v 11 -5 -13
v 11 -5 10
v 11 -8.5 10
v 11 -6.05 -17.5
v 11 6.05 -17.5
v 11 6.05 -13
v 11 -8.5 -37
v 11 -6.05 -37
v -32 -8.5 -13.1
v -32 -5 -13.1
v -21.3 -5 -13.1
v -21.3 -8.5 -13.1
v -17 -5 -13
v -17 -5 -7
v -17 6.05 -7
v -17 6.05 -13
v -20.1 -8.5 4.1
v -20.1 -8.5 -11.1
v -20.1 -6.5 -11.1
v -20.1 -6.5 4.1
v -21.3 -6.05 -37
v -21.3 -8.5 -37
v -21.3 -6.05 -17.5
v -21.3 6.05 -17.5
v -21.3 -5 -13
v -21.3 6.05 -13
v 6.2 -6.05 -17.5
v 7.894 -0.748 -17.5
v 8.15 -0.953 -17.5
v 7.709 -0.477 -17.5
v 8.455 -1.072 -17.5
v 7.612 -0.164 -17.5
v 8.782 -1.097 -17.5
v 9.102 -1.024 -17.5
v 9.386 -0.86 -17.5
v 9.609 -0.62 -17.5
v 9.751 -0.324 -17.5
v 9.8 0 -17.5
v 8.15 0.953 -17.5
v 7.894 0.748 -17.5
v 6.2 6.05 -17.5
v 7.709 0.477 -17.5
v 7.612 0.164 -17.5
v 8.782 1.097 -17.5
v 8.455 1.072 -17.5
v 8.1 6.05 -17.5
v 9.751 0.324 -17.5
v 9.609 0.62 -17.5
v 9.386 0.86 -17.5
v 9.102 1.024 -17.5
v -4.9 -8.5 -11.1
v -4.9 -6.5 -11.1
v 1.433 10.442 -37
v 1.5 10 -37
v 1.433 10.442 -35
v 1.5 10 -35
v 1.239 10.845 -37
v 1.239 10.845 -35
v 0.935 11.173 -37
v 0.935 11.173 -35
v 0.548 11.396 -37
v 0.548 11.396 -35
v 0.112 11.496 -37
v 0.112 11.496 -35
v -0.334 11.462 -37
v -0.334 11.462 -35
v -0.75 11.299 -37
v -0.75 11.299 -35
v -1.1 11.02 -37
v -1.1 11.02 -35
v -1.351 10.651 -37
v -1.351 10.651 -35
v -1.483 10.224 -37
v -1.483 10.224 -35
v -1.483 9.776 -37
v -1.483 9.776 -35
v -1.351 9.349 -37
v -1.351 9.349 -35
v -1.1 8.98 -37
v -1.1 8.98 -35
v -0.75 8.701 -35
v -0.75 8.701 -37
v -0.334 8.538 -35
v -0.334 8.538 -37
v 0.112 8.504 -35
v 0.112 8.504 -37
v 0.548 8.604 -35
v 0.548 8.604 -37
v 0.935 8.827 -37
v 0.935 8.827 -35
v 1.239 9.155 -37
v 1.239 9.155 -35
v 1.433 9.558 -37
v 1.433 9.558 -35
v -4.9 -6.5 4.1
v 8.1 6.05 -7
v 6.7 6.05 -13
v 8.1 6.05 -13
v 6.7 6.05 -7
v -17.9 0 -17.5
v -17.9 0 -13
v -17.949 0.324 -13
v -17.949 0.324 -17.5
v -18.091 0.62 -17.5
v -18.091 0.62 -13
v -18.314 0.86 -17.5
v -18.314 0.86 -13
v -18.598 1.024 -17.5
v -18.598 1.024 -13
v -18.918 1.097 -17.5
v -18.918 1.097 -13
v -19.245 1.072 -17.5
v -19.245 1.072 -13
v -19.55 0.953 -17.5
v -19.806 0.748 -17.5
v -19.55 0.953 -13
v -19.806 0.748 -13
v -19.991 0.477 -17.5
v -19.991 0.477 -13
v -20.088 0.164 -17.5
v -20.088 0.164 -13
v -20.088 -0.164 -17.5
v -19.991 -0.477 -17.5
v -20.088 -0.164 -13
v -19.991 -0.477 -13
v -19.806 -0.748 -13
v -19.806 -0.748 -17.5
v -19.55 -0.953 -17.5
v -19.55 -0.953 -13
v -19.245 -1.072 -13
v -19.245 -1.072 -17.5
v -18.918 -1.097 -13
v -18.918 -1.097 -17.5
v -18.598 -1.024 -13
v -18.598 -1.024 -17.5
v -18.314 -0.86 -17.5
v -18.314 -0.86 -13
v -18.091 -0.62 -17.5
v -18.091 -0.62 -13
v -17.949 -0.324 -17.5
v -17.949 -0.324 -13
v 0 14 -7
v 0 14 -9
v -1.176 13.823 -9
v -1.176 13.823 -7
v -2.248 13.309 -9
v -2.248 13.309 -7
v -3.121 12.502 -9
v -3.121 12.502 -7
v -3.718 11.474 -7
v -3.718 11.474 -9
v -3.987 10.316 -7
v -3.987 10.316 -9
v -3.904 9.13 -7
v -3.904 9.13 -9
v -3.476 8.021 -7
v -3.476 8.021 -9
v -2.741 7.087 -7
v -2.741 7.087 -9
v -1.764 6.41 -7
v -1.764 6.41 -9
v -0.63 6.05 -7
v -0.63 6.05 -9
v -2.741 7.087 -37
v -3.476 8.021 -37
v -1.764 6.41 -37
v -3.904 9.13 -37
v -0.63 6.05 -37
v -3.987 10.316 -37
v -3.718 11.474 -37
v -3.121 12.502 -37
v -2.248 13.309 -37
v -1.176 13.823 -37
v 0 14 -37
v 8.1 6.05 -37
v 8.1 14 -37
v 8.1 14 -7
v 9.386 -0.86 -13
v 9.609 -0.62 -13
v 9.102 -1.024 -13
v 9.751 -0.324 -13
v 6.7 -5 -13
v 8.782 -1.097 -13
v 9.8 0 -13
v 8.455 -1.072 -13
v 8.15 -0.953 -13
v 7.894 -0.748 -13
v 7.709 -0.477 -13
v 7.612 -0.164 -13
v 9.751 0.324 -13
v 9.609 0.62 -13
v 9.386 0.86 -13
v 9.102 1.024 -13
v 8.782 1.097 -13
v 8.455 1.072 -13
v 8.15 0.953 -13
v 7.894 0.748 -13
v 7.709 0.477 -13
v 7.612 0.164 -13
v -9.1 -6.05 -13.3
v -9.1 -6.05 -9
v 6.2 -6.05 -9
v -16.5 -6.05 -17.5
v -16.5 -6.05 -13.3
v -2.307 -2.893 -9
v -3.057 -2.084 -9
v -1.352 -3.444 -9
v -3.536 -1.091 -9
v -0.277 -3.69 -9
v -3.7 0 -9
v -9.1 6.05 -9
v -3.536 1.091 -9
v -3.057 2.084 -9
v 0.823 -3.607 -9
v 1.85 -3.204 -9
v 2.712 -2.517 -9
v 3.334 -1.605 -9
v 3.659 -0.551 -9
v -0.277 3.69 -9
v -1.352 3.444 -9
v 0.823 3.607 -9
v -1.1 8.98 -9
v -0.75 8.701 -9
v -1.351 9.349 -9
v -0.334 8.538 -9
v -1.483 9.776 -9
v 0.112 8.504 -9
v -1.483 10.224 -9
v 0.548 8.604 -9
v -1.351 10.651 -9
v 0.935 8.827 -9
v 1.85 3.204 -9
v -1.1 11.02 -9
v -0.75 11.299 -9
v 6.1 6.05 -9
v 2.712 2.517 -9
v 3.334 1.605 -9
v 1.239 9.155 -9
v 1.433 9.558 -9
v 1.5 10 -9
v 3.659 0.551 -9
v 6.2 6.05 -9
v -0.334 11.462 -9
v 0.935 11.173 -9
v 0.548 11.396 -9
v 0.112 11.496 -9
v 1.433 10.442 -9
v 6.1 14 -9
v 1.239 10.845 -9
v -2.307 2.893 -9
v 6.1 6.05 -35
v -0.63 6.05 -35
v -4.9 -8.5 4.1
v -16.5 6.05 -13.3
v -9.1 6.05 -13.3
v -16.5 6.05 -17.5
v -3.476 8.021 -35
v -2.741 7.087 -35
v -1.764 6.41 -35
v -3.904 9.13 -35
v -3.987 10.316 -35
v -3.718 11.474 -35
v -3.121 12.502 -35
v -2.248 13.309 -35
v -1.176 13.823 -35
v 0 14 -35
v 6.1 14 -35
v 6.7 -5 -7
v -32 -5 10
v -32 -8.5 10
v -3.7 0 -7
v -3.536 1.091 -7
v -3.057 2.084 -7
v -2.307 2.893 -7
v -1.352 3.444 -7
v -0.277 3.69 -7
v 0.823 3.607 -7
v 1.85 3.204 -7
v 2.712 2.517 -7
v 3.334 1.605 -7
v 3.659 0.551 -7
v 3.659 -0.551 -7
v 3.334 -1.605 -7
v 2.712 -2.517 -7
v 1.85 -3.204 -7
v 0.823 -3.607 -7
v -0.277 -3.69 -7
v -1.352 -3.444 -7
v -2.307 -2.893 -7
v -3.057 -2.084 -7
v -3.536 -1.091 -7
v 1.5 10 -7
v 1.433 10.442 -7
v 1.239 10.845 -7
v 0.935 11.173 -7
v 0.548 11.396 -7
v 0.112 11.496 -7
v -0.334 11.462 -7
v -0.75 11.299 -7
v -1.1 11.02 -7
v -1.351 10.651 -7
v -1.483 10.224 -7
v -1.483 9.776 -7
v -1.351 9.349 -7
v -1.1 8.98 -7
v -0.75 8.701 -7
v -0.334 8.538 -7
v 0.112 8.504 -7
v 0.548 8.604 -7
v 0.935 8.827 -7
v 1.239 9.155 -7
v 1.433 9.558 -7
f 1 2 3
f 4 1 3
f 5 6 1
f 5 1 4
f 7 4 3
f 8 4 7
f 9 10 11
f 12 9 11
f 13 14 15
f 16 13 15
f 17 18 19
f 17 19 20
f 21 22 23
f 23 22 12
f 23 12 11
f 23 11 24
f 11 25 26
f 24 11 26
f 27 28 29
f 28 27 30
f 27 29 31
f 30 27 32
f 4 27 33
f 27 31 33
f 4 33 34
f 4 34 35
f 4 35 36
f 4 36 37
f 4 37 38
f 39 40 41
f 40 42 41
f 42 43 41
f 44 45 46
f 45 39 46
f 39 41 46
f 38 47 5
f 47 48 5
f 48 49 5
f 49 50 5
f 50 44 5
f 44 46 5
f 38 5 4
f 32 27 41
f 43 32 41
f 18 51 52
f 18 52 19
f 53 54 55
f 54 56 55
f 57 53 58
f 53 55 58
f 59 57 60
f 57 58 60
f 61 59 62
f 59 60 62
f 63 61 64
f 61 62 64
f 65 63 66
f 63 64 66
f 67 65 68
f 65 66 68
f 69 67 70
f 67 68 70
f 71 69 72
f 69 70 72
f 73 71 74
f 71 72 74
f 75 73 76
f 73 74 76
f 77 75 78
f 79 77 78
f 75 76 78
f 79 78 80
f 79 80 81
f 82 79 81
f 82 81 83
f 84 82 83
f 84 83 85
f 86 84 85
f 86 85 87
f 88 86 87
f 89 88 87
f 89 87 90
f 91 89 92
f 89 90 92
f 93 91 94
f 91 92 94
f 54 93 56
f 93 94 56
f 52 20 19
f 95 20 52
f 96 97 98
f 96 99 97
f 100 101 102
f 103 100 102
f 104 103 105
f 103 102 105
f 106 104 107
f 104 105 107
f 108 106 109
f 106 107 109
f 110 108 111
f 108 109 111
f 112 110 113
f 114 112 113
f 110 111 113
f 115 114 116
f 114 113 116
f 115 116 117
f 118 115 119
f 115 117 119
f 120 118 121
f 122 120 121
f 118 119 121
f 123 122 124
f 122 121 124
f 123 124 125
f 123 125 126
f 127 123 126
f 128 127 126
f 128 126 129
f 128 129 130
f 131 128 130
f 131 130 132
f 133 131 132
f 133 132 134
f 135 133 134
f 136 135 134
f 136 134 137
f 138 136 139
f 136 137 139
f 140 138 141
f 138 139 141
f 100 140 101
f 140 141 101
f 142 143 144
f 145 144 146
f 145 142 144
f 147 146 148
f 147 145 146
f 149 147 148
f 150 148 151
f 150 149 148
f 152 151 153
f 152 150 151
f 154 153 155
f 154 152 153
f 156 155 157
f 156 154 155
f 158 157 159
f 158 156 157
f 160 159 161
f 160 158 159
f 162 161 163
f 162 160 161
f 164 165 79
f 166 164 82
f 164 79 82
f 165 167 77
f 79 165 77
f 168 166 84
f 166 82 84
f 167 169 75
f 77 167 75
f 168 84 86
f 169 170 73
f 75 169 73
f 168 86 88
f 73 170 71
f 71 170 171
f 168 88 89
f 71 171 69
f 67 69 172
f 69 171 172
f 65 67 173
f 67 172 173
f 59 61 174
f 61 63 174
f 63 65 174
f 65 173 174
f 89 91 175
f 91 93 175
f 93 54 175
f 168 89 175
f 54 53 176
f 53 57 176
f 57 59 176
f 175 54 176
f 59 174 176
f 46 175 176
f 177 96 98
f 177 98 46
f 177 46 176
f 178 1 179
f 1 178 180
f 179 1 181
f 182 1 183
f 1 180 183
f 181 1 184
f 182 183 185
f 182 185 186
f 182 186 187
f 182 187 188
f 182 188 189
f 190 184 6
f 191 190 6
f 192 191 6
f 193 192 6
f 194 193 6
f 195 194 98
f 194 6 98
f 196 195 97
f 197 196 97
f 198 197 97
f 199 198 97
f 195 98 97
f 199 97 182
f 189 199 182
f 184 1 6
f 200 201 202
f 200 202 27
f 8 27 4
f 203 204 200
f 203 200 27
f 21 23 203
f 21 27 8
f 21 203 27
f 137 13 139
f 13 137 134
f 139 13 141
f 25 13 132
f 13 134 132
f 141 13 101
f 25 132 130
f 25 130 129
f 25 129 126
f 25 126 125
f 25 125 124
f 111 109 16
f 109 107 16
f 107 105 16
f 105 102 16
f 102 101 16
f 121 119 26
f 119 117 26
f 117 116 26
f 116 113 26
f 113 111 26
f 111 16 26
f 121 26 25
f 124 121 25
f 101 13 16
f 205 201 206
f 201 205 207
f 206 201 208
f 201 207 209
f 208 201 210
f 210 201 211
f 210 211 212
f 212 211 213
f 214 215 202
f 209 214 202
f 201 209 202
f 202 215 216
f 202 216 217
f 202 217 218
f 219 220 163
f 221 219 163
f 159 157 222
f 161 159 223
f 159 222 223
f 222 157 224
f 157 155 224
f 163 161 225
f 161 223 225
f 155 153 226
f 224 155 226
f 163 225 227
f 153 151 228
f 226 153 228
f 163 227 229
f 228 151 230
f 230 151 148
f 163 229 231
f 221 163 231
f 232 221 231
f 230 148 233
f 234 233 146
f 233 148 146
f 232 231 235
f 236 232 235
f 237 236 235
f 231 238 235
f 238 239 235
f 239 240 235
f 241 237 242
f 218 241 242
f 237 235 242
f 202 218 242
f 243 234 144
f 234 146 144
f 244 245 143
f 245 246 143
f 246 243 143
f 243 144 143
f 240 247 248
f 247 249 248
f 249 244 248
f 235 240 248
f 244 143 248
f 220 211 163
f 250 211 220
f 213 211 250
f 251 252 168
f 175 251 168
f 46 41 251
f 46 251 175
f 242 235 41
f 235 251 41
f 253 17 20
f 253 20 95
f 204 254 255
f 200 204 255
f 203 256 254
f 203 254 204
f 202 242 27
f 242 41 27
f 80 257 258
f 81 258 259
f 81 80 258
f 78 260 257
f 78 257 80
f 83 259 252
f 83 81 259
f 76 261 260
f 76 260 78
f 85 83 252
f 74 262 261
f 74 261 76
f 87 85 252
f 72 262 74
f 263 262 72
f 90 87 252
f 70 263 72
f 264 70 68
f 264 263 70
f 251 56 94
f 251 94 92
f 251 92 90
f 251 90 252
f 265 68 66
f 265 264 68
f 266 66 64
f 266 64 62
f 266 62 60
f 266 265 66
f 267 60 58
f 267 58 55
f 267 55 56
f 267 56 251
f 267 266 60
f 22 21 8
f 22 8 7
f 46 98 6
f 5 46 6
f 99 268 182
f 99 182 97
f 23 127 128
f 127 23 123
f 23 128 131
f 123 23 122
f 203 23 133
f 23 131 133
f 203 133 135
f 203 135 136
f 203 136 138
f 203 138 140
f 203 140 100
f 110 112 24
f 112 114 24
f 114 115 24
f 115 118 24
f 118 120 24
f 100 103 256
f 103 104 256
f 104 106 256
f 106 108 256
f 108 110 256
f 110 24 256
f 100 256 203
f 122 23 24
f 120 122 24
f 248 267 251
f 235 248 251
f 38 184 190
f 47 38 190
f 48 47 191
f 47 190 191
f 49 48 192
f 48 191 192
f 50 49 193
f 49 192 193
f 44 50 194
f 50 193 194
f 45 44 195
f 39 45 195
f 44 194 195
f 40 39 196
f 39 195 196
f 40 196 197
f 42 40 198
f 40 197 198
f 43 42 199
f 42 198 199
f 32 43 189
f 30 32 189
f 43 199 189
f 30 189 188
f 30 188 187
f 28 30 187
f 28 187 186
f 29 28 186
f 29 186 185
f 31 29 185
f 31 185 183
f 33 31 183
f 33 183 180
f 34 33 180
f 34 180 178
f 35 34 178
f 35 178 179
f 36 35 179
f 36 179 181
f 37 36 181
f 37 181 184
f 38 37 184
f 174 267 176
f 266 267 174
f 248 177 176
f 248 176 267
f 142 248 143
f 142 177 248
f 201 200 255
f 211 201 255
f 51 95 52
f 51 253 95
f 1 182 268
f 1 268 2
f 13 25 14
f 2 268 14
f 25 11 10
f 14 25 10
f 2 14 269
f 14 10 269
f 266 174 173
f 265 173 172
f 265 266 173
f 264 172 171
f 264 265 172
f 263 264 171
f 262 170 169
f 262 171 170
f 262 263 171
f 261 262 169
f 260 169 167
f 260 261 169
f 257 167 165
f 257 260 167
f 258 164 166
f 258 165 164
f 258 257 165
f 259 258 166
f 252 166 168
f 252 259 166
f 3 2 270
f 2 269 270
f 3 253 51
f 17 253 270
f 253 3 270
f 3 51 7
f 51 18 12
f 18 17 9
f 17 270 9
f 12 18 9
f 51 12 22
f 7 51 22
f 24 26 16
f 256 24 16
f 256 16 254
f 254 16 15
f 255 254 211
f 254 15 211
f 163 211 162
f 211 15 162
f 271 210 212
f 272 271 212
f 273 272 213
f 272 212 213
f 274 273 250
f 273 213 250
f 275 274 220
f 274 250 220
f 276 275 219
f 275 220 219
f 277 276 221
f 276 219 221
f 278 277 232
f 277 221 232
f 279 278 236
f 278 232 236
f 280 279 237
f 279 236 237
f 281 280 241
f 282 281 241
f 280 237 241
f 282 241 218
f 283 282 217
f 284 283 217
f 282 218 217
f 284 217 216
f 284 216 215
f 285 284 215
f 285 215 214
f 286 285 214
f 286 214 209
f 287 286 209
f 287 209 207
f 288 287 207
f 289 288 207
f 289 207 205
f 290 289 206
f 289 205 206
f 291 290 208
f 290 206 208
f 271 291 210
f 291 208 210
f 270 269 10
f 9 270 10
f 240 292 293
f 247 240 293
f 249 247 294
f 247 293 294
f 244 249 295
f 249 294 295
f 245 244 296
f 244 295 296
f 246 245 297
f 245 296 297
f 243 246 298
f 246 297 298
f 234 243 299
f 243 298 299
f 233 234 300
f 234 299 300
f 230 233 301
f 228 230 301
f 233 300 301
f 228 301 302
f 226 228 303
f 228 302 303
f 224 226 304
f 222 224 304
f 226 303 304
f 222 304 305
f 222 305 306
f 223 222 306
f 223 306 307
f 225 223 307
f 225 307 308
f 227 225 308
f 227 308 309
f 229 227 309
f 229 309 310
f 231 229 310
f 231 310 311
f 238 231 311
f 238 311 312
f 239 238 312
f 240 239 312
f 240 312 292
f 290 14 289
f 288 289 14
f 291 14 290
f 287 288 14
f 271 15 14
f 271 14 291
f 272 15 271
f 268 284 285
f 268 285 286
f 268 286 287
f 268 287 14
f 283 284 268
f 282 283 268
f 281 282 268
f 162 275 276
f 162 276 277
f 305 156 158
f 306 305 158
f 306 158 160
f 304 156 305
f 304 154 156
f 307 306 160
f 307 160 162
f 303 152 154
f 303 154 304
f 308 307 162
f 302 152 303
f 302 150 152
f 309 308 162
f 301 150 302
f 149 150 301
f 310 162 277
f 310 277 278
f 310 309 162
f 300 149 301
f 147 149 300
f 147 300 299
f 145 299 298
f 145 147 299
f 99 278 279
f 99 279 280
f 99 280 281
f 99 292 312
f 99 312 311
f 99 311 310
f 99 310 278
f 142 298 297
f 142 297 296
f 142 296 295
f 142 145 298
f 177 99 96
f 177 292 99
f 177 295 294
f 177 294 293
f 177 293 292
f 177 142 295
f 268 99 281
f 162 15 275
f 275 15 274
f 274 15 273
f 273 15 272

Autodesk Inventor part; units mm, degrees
sketch "スケッチ1" plane through (0, 0, 0) normal (0, 0, 1) x (1, 0, 0)
  circle A0 centre (0, 0) radius 1.5
  circle A1 centre (0, 0) radius 4
  line L0 (6.1, 4) -> (6.1, -4)
  line L1 (-27.76, 0) -> (17.46, 0) construction
  line L2 (6.1, 4) -> (0, 4)
  line L3 (6.1, -4) -> (0, -4)
  line L4 (6.1, -4) -> (8.1, -4)
  line L5 (8.1, -4) -> (8.1, 4)
  line L6 (8.1, 4) -> (6.1, 4)
  line L7 (0, -13.6) -> (0, 18.6) construction
  circle A2 centre (0, 10) radius 1.5
  circle A3 centre (0, 10) radius 4
  line L8 (6.1, 14) -> (6.1, 6)
  line L9 (6.1, 14) -> (0, 14)
  line L10 (6.1, 6) -> (0, 6)
  line L11 (6.1, 6) -> (8.1, 6)
  line L12 (8.1, 6) -> (8.1, 14)
  line L13 (8.1, 14) -> (6.1, 14)
  line L14 (-16.4, 6.05) -> (6.1, 6.05) construction
  line L15 (6.1, 6.05) -> (6.1, -6.05)
  line L16 (6.1, -6.05) -> (-16.4, -6.05) construction
  line L17 (-16.4, -6.05) -> (-16.4, 6.05)
  line L18 (-16.4, 6.05) -> (6.1, -6.05) construction
  line L19 (6.1, 6.05) -> (-16.4, -6.05) construction
  line L20 (-21.3, 6.05) -> (11, 6.05) construction
  line L21 (11, 6.05) -> (11, -6.05) construction
  line L22 (11, -6.05) -> (-21.3, -6.05)
  line L23 (-21.3, -6.05) -> (-21.3, 6.05) construction
  line L24 (-21.3, 6.05) -> (11, -6.05) construction
  line L25 (11, 6.05) -> (-21.3, -6.05) construction
  line L26 (-21.3, 0) -> (11, 0) construction
  circle A4 centre (-19, 0) radius 1.1
  line L27 (-5.15, 6.05) -> (-5.15, -6.05) construction
  circle A5 centre (0, 0) radius 2.425
  circle A6 centre (0, 0) radius 6.05
  circle A7 centre (0, 0) radius 9
  line L28 (8.1, -7) -> (-21.3, -7)
  line L29 (-21.3, -7) -> (-21.3, 6.05)
  line L30 (-21.3, 6.05) -> (8.1, 6.05)
  line L31 (8.1, 6.05) -> (8.1, -7)
  line L32 (-21.3, -5) -> (-20.943492, -5)
  line L33 (-20.943492, -5) -> (8.1, -5)
  circle A8 centre (8.7, 0) radius 1.1
  line L34 (8.1, 6.05) -> (11, 6.05)
  line L35 (11, 6.05) -> (11, -6.05)
  point P0 (6.1, 0)
  point P1 (6.1, 10)
  point P2 (-5.15, 0)
  point P3 (-5.15, 0)
  point P4 (-0.630476, 6.05)
  point P5 (8.1, 6.05)
  point P6 (8.1, -6.05)
  point P7 (0, 6.05)
  point P8 (-6.663145, 6.05)
  point P9 (-6.663145, -6.05)
  point P10 (0, -6.05)
  point P11 (6.1, 6.617401)
  point P12 (6.663145, 6.05)
  point P13 (0.630476, 6.05)
  point P14 (0.489992, 6.030125)
  point P15 (0.776209, 6)
  point P16 (8.062258, 4)
  point P17 (8.1, 3.923009)
  point P18 (8.062258, -4)
  point P19 (8.1, -3.923009)
  point P20 (6.708204, 6)
  dimension "d0" = 3
  dimension "d1" = 8
  dimension "d3" = 8
  dimension "d4" = 2
  dimension "d11" = 10
  dimension "d21" = 12.1
  dimension "d22" = 22.5
  dimension "d23" = 32.3
  dimension "d24" = 2.2
  dimension "d26" = 27.7
  dimension "d28" = 18
  dimension "d29" = 12.1
  dimension "d30" = 4.85
  dimension "d31" = 6.1
  dimension "d32" = 7
  dimension "d55" = 2
extrude "押し出し1" add sketch "スケッチ1" along normal blind 2 contours A1 | A1 L2 A6 L3 | L2 L0 L3 A6 | L6 A7 L5 A8 L4 L0 | L6 L5 A7 | A7 L5 L4 | L5 A8 | A5
extrude "押し出し2" add sketch "スケッチ1" against normal blind 7 contours L6 A7 L5 A8 L4 L0 | L6 L5 A7 | A7 L5 L4 | L5 A8
extrude "押し出し3" add sketch "スケッチ1" against normal blind 2 from surface at -7 contours A6 A3 L30 L8 L10 | L10 A3 A6 | L8 L30 A7 L11 | A3 A6 | A6 L30 A3 | A7 L30 L12 L11 | L30 A3 A7 L8 | L8 A7 L30 | A3 L30 A6 | L30 A3 A7 A2 | A7 L8 L13 L12 L30 | A7 A3 L9 L8 | A7 A2 A3
pattern_linear "矩形状パターン1" count 2 spacing 28 along (0, 0, -1) of "押し出し3"
ref_plane "作業平面1" through (0, 0, -17.5) normal (0, 0, 1) x (1, 0, 0)
extrude "押し出し4" add sketch "スケッチ1" against normal up to surface (10.5 mm away) from surface at -7 contours A0 | A1 | A1 L2 A6 L3 | A1 L3 A6 L33 A3 L10 L2 | A6 L10 L15 L2 | L2 L0 L3 A6 | L3 L15 L33 A6 | L6 A7 L5 A8 L4 L0 | L15 L11 A7 L6 | A6 A3 L30 L8 L10 | L10 A3 A6 | L4 A7 L33 L15 | L33 L15 L22 A6 | A6 L33 | A7 L11 L31 L6 | L6 L5 A7 | L8 L30 A7 L11 | A3 A6 | A6 L30 A3 | A7 L5 L4 | L4 L31 L33 A7 | L33 A7 L22 L15 | L22 A7 L28 | L22 A7 L33 A6 | L33 A7 L30 A3 A6 | A7 L30 L12 L11 | A3 L30 A6 | L33 L31 L22 A7 | A7 L28 L29 L22 | L22 L17 L33 A7 | L33 L17 L30 A7 | L5 A8 | L22 L31 L28 A7 | L22 L29 L32 L33 L17 | L33 L32 L29 L30 L17 | A4 | A5
ref_plane "作業平面2" through (0, 0, -13.3) normal (0, 0, 1) x (1, 0, 0)
extrude "押し出し6" cut sketch "スケッチ1" against normal blind 23.4 from surface at -13.3 contours A0 | A1 | A1 L2 A6 L3 | A1 L3 A6 L33 A3 L10 L2 | A6 L10 L15 L2 | L2 L0 L3 A6 | L3 L15 L33 A6 | A6 A3 L30 L8 L10 | L10 A3 A6 | L33 L15 L22 A6 | A6 L33 | A3 A6 | A6 L30 A3 | L22 A7 L33 A6 | L33 A7 L30 A3 A6 | A3 L30 A6 | L22 L17 L33 A7 | L33 L17 L30 A7 | A5
ref_plane "作業平面3" through (0, 0, -9) normal (0, 0, 1) x (1, 0, 0)
extrude "押し出し7" cut sketch "スケッチ1" against normal up to surface (4.3 mm away) from surface at -9 contours A0 | A1 | A1 L2 A6 L3 | A1 L3 A6 L33 A3 L10 L2 | L10 A3 A6 | A6 L33 | A3 A6 | L22 A7 L33 A6 | L33 A7 L30 A3 A6 | A3 L30 A6 | A5 picked at (-0.459231, 6.046871)
extrude "押し出し8" cut sketch "スケッチ1" against normal up to surface (9 mm away) contours A0 | A5
extrude "押し出し9" cut sketch "スケッチ1" against normal through all contours A4
extrude "押し出し10" add sketch "スケッチ1" against normal up to surface (28 mm away) from surface at -9 contours L22 A7 L28 | L8 A7 L30 | A7 L28 L29 L22 | A7 L8 L13 L12 L30 | L22 L31 L28 A7
extrude "押し出し11" cut sketch "スケッチ1" against normal up to surface (19.5 mm away) from surface at -17.5 contours A6 A3 L30 L8 L10 | L10 A3 A6 | L8 L30 A7 L11 | A3 A6 | A6 L30 A3 | A7 L30 L12 L11 | A3 L30 A6
sketch "スケッチ3" plane through (0, 4, 2) normal (0, 1, 0) x (1, 0, 0)
  line L0 (8.1, 0) -> (0, 0) projected
  line L1 (8.1, 9) -> (8.1, 0) projected
  line L2 (6.1, 9) -> (8.1, 9) projected
  line L3 (6.1, 2) -> (6.1, 9) projected
  line L4 (6.1, 2) -> (0, 2) projected
  line L5 (0, 2) -> (0, 0) projected
  line L6 (0, 2) -> (0, 2) projected
  line L7 (0, 2) -> (0, 0) projected
  line L8 (0, 0) -> (0, 0) projected
  line L9 (0, 2) -> (0, 0) projected
  line L10 (-4, 2) -> (-4, 0) projected
  line L11 (-4, 2) -> (0, 2) projected
  line L12 (-4, 0) -> (0, 0) projected
extrude "押し出し12" cut sketch "スケッチ3" against normal through all
extrude "押し出し13" add sketch "スケッチ1" along normal blind 10 and the other way blind 7 contours L33 L15 L22 A6 | A6 L33 | L33 A7 L22 L15 | L22 A7 L28 | L22 A7 L33 A6 | L33 L31 L22 A7 | A7 L28 L29 L22 | L22 L17 L33 A7 | L22 L31 L28 A7 | L22 L29 L32 L33 L17
sketch "スケッチ4" plane through (-21.3, 6.05, -17.5) normal (-1, 0, 0) x (0, 0, 1)
  line L0 (27.5, -13.05) -> (-19.5, -13.05) projected
  line L1 (27.5, -11.05) -> (27.5, -13.05) projected
  line L2 (10.5, -11.05) -> (27.5, -11.05) projected
  line L3 (10.5, 0) -> (10.5, -11.05) projected
  line L4 (10.5, 0) -> (0, 0) projected
  line L5 (0, -12.1) -> (0, 0) projected
  line L6 (0, -12.1) -> (-19.5, -12.1) projected
  line L7 (-19.5, -12.1) -> (-19.5, -13.05) projected
  line L8 (10.5, -11.05) -> (10.5, -13.05)
  point P0 (17.5, -6.05)
extrude "押し出し14" add sketch "スケッチ4" along normal blind 10.7 contours L0 L8 L2 L1
sketch "スケッチ5" plane through (-21.3, -5, -47) normal (0, -1, 0) x (1, 0, 0)
  line L0 (29.4, 10) -> (29.4, 57) projected
  line L1 (29.4, 57) -> (-10.7, 57) projected
  line L2 (-10.7, 40) -> (-10.7, 57) projected
  line L3 (0, 40) -> (-10.7, 40) projected
  line L4 (0, 40) -> (0, 10) projected
  line L5 (0, 10) -> (29.4, 10) projected
  line L6 (-10.7, 43.5) -> (29.4, 43.5) construction
  line L7 (1.2, 51.1) -> (16.4, 51.1)
  line L8 (16.4, 51.1) -> (16.4, 35.9)
  line L9 (16.4, 35.9) -> (1.2, 35.9)
  line L10 (1.2, 35.9) -> (1.2, 51.1)
  line L11 (1.2, 51.1) -> (16.4, 35.9) construction
  line L12 (16.4, 51.1) -> (1.2, 35.9) construction
  line L13 (-10.7, 57) -> (-10.7, 40) projected
  line L14 (-10.7, 40) -> (-10.7, 33.9)
  line L15 (-10.7, 33.9) -> (0, 33.9)
  line L16 (29.4, 57) -> (-10.7, 57) projected
  point P0 (21.3, 47)
  point P1 (8.8, 43.5)
  dimension "d63" = 15.2
  dimension "d64" = 15.2
  dimension "d68" = 13.5
  dimension "d69" = 2
  dimension "d105" = 19.5
extrude "押し出し17" add sketch "スケッチ5" along normal blind 1.5 from surface at 2 contours L5 L4 L3 L2 L1 L0 | L7 L8 L9 L10
extrude "押し出し15" cut sketch "スケッチ5" against normal blind 2 from surface at 3.5 contours L7 L8 L9 L10
ref_plane "作業平面4" through (-12.5, -8.5, -11.1) normal (-1, 0, 0) x (0, 0, 1)
ref_plane "作業平面5" through (-20.1, -6.5, -3.5) normal (0, 0, 1) x (1, 0, 0)
extrude "押し出し16" add sketch "スケッチ5" along normal up to surface (3.5 mm away) contours L15 L14 L3 L4
extrude "押し出し18" add sketch "スケッチ1" against normal up to surface (10.5 mm away) from surface at -7 contours L6 A7 L5 A8 L4 L0 | L15 L11 A7 L6 | L4 A7 L33 L15 | A7 L11 L31 L6 | L4 L31 L33 A7 | L33 A7 L22 L15 | L31 L12 L34 L35 L22 L5 A7 A8 | A7 A8 L5 | A7 L30 L12 L11 | L33 L31 L22 A7 | L5 A8 A7 | A8 A7 L5 | L5 A8 | A8 A7
extrude "押し出し19" cut sketch "スケッチ1" against normal through all contours A8 A7 L5 | L5 A8 | A8 A7 picked at (8.4, 0)
sketch "スケッチ6" plane through (8.1, -5, 10) normal (1, 0, 0) x (0, 0, -1)
  line L0 (27.5, -1.05) -> (17, -1.05) projected
  line L1 (17, -1.05) -> (17, 0) projected
  line L2 (17, 0) -> (0, 0) projected
  line L3 (0, 0) -> (0, -3.5) projected
  line L4 (0, -3.5) -> (47, -3.5) projected
  line L5 (47, -1.05) -> (47, -3.5) projected
  line L6 (27.5, -1.05) -> (47, -1.05) projected
  point P0 (10, 5)
extrude "押し出し20" add sketch "スケッチ6" along normal up to surface (2.9 mm away)
sketch "スケッチ7" plane through (6.1, -6.05, -17.5) normal (0, 0, -1) x (-1, 0, 0)
  circle A0 centre (-2.6, 6.05) radius 1.1
  line L0 (-4.9, 0) -> (0, 0)
  line L1 (0, 0) -> (0, 12.1)
  line L2 (0, 12.1) -> (-2, 12.1)
  line L3 (-2, 12.1) -> (-4.9, 12.1)
  line L4 (-4.9, 12.1) -> (-4.9, 0)
  line L5 (0, 12.1) -> (0, 0)
  line L6 (0, 0) -> (6.1, 0)
  arc A1 (6.1, 12.1) -> (6.1, 0) centre (6.1, 6.05) ccw
  line L7 (0, 12.1) -> (6.1, 12.1)
  arc A2 (12.763145, 0) -> (12.763145, 12.1) centre (6.1, 6.05) ccw
  line L8 (12.763145, 0) -> (22.5, 0)
  line L9 (22.5, 0) -> (22.5, 12.1)
  line L10 (12.763145, 12.1) -> (22.5, 12.1)
  line L11 (22.5, 12.1) -> (22.5, 0)
  line L12 (22.5, 0) -> (27.4, 0)
  line L13 (27.4, 0) -> (27.4, 12.1)
  line L14 (27.4, 12.1) -> (22.5, 12.1)
  circle A3 centre (25.1, 6.05) radius 1.1
  line L15 (6.730476, 12.1) -> (12.763145, 12.1)
  line L16 (6.1, 0) -> (12.763145, 0)
  circle A4 centre (6.1, 6.05) radius 2.425
  line L17 (0, 12.1) -> (6.1, 12.1)
  line L18 (6.1, 12.1) -> (6.730476, 12.1)
  line L19 (-0.1, 12.1) -> (-0.1, 0)
  line L20 (-4.9, 0) -> (0, 0)
  line L21 (22.6, 12.1) -> (22.6, 0)
  line L22 (22.5, 0) -> (27.4, 0)
  arc A5 (6.1, 12.2) -> (6.1, -0.1) centre (6.1, 6.05) ccw
  arc A6 (12.83718, -0.067222) -> (12.83718, 12.167222) centre (6.1, 6.05) ccw
  circle A7 centre (6.1, 6.05) radius 3.7
  line L23 (15.2, 12.1) -> (15.2, 0)
  line L24 (27.4, 1.05) -> (-4.9, 1.05)
  line L25 (23.1, 1.05) -> (23.1, 12.1)
  line L26 (-0.6, 1.05) -> (-0.6, 12.1)
  line L27 (22.5, 12.1) -> (22.5, 0)
  line L28 (22.5, 0) -> (27.4, 0)
  line L29 (27.4, 0) -> (27.4, 12.1)
  line L30 (27.4, 12.1) -> (22.5, 12.1)
  point P0 (22.6, 0)
  point P1 (-0.1, 0)
  point P2 (12.89761, 0)
  point P3 (12.89761, 12.1)
  point P4 (4.995464, 12.1)
  point P5 (4.995464, 0)
  point P6 (15.2, 6.05)
  dimension "d80" = 0.1
  dimension "d81" = 0.1
  dimension "d84" = 0.1
  dimension "d85" = 0.1
  dimension "d99" = 2
  dimension "d101" = 2
  dimension "d104" = 7.4
extrude "押し出し21" cut sketch "スケッチ7" against normal up to surface (4.2 mm away) contours L19 L24 L1 L0 | L19 L2 L1 A5 L24 | A5 L1 | L9 L24 L21 L12 | L9 L14 L21 L24
sketch "スケッチ7 outline for 押し出し22" plane through (6.1, -6.05, -17.5) normal (0, 0, -1) x (-1, 0, 0)
  arc A0 (12.763145, 12.1) -> (12.763145, 0) centre (6.1, 6.05) cw
  line L0 (12.763145, 0) -> (15.2, 0)
  line L1 (15.2, 0) -> (15.2, 12.1)
  line L2 (15.2, 12.1) -> (12.763145, 12.1)
  arc A1 (6.1, 0) -> (6.1, 12.1) centre (6.1, 6.05) cw
  line L3 (6.1, 12.1) -> (-0.1, 12.1)
  line L4 (-0.1, 12.1) -> (-0.1, 0)
  line L5 (-0.1, 0) -> (6.1, 0)
extrude "押し出し22" cut sketch "スケッチ7 outline for 押し出し22" against normal up to surface (8.5 mm away)
extrude "押し出し23" cut sketch "スケッチ7" against normal through all contours A7
extrude "押し出し26" cut sketch "スケッチ7" along normal blind 6 from surface at -10.5 contours L4 L3 L2 L26 L24 | L25 L14 L13 L24
properties part number "housing_shaft_link_base"
